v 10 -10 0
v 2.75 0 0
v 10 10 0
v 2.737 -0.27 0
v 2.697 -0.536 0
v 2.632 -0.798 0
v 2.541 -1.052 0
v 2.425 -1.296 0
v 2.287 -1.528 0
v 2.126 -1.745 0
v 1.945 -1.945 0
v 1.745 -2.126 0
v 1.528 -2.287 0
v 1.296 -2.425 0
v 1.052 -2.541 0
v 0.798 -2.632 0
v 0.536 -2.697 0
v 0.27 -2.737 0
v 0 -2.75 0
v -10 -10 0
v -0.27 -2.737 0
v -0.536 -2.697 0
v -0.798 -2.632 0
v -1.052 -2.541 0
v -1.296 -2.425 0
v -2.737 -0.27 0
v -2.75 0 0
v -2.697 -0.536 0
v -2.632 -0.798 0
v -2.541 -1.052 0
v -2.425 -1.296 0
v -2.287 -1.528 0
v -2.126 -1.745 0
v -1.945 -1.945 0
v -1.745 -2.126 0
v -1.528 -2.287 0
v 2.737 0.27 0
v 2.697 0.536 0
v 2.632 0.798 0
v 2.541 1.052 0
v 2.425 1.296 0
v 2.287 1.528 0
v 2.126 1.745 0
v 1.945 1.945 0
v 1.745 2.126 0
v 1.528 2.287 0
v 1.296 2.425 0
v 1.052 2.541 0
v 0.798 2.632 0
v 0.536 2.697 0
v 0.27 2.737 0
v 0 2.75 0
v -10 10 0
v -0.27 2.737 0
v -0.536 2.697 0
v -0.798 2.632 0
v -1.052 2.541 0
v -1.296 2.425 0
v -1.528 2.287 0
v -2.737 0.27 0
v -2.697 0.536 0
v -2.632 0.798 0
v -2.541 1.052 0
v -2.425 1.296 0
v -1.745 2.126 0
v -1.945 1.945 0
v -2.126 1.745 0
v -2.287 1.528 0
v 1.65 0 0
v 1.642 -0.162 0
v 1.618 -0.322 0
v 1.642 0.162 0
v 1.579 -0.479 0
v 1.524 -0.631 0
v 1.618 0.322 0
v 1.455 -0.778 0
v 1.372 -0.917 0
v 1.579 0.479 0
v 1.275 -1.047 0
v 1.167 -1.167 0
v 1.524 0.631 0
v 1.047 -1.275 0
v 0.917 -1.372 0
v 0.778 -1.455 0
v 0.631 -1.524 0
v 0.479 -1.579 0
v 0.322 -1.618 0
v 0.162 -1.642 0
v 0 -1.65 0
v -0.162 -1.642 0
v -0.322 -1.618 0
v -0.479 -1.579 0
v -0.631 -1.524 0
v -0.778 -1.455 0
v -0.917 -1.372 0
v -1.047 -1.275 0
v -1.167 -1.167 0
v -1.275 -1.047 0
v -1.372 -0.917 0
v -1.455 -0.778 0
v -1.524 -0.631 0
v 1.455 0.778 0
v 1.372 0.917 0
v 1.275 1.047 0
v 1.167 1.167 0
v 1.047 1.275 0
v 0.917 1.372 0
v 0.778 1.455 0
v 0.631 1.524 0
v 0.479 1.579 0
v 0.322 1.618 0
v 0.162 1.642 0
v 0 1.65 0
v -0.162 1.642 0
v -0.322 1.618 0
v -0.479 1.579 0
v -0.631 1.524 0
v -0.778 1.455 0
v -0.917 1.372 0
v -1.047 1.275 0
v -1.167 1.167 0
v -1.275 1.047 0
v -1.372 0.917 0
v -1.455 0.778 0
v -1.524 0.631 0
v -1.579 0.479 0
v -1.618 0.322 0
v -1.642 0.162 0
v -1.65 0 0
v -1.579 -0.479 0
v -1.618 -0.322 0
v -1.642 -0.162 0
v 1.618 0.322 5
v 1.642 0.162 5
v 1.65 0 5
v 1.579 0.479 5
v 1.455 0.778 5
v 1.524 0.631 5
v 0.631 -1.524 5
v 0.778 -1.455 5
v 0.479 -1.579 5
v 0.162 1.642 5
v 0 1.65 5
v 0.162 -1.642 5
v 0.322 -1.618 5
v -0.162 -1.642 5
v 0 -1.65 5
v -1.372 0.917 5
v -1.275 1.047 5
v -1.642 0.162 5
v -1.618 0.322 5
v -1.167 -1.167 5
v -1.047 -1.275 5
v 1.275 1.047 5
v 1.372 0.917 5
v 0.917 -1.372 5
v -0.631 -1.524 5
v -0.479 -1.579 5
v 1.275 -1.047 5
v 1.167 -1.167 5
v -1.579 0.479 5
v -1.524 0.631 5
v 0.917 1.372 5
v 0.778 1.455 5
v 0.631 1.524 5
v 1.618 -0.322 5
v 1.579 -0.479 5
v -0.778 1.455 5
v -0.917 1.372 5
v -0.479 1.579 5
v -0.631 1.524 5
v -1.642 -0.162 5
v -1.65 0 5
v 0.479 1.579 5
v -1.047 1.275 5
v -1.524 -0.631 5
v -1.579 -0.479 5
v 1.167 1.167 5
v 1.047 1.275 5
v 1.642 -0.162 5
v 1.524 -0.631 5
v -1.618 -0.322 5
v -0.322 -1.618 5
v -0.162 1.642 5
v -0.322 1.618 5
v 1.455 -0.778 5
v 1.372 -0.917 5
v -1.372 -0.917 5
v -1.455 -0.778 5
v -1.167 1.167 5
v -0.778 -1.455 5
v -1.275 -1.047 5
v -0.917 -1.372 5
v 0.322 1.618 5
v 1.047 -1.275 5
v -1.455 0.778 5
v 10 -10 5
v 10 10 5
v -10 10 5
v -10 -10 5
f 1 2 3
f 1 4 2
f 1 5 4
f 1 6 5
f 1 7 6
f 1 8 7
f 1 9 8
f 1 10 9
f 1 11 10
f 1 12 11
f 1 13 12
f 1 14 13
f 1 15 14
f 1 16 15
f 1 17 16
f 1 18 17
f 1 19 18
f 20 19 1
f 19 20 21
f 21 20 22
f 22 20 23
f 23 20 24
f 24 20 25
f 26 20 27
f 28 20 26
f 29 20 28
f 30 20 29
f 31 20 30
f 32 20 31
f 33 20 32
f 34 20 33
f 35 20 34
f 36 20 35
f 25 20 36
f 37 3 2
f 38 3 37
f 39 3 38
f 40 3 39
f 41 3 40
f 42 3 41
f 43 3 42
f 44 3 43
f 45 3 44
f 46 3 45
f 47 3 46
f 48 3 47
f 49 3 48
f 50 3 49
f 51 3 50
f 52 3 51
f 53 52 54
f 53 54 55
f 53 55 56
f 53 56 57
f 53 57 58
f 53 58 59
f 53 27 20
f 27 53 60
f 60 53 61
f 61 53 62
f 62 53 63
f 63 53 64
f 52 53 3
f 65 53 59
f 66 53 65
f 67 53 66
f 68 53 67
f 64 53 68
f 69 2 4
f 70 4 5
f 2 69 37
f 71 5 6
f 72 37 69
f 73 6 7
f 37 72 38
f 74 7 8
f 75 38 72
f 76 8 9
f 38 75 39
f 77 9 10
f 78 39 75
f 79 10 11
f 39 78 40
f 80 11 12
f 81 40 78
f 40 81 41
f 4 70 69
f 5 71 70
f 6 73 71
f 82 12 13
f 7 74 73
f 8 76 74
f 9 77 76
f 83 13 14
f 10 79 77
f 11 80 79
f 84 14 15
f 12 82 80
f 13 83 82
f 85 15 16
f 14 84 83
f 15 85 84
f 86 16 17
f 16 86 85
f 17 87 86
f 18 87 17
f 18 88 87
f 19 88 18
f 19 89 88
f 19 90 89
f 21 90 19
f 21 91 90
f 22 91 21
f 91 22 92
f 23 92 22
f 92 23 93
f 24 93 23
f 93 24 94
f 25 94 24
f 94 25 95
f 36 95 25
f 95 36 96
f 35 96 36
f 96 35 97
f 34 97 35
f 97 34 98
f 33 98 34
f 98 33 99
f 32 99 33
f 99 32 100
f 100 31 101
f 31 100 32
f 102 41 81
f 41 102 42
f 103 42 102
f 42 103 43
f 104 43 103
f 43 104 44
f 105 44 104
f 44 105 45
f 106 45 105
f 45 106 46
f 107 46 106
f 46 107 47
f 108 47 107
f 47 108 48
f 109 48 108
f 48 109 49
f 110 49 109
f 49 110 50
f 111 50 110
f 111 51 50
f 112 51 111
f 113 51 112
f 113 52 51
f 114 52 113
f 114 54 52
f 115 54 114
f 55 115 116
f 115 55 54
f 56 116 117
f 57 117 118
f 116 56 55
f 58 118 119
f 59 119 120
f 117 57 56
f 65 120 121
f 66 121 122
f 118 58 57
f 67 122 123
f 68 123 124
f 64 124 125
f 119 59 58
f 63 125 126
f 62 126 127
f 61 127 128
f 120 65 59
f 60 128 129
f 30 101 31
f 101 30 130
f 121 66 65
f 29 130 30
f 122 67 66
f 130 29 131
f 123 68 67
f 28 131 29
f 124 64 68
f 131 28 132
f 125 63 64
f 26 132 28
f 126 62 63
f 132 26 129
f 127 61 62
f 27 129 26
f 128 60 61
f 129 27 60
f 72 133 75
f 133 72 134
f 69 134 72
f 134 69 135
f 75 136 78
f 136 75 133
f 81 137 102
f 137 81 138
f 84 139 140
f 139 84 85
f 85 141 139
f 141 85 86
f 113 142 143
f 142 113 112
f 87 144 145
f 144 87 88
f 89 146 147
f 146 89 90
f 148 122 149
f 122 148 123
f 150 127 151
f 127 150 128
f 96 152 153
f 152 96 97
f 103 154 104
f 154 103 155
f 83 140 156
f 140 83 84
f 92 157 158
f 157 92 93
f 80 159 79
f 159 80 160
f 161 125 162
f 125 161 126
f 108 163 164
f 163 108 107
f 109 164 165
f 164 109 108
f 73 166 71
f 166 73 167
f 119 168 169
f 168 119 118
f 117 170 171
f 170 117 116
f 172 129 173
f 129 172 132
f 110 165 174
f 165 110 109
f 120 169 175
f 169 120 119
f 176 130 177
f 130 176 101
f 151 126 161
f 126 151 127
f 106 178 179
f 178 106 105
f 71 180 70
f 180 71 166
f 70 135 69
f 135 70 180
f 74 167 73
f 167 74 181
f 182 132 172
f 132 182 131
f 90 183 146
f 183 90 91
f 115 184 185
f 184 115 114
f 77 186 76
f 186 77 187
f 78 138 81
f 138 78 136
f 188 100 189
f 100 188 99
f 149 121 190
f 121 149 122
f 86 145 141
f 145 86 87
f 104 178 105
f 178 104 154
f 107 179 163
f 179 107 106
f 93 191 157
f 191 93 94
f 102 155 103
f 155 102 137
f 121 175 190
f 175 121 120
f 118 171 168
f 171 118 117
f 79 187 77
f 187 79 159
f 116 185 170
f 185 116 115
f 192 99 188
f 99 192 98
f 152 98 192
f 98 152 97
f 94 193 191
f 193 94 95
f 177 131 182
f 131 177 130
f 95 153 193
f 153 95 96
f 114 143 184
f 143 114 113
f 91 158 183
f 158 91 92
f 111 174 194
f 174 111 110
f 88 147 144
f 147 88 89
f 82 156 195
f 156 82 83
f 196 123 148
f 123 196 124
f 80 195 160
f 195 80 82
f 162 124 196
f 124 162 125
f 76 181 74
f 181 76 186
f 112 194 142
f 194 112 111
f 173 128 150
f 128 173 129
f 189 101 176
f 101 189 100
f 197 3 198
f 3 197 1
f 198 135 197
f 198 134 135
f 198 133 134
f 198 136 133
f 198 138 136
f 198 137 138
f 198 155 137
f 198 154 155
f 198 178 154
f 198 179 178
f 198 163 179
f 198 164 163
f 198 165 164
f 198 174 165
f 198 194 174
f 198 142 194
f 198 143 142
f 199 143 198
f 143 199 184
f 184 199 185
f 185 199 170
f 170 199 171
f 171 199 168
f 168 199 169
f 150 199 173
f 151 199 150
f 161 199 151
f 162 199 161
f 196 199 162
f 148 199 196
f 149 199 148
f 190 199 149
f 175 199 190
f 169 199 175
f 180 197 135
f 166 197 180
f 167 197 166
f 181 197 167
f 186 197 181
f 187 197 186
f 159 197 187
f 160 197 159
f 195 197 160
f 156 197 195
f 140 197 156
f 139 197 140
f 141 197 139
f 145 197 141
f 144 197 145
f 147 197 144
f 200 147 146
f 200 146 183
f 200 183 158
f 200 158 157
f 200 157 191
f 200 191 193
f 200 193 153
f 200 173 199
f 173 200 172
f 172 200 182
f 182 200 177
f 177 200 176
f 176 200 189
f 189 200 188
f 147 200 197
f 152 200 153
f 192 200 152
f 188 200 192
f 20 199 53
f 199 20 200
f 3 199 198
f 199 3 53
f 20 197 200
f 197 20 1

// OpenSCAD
$fn=64;
difference(){translate(v = [-10.000, -10.000])
cube(size = [20, 20, 5]);
union(){color("Gainsboro"){translate(v = [0, 0, -3])
cylinder(h = 3, r = 2.750);
}
color("DarkGray"){cylinder(h = 10, r = 1.650);
}
}
}
